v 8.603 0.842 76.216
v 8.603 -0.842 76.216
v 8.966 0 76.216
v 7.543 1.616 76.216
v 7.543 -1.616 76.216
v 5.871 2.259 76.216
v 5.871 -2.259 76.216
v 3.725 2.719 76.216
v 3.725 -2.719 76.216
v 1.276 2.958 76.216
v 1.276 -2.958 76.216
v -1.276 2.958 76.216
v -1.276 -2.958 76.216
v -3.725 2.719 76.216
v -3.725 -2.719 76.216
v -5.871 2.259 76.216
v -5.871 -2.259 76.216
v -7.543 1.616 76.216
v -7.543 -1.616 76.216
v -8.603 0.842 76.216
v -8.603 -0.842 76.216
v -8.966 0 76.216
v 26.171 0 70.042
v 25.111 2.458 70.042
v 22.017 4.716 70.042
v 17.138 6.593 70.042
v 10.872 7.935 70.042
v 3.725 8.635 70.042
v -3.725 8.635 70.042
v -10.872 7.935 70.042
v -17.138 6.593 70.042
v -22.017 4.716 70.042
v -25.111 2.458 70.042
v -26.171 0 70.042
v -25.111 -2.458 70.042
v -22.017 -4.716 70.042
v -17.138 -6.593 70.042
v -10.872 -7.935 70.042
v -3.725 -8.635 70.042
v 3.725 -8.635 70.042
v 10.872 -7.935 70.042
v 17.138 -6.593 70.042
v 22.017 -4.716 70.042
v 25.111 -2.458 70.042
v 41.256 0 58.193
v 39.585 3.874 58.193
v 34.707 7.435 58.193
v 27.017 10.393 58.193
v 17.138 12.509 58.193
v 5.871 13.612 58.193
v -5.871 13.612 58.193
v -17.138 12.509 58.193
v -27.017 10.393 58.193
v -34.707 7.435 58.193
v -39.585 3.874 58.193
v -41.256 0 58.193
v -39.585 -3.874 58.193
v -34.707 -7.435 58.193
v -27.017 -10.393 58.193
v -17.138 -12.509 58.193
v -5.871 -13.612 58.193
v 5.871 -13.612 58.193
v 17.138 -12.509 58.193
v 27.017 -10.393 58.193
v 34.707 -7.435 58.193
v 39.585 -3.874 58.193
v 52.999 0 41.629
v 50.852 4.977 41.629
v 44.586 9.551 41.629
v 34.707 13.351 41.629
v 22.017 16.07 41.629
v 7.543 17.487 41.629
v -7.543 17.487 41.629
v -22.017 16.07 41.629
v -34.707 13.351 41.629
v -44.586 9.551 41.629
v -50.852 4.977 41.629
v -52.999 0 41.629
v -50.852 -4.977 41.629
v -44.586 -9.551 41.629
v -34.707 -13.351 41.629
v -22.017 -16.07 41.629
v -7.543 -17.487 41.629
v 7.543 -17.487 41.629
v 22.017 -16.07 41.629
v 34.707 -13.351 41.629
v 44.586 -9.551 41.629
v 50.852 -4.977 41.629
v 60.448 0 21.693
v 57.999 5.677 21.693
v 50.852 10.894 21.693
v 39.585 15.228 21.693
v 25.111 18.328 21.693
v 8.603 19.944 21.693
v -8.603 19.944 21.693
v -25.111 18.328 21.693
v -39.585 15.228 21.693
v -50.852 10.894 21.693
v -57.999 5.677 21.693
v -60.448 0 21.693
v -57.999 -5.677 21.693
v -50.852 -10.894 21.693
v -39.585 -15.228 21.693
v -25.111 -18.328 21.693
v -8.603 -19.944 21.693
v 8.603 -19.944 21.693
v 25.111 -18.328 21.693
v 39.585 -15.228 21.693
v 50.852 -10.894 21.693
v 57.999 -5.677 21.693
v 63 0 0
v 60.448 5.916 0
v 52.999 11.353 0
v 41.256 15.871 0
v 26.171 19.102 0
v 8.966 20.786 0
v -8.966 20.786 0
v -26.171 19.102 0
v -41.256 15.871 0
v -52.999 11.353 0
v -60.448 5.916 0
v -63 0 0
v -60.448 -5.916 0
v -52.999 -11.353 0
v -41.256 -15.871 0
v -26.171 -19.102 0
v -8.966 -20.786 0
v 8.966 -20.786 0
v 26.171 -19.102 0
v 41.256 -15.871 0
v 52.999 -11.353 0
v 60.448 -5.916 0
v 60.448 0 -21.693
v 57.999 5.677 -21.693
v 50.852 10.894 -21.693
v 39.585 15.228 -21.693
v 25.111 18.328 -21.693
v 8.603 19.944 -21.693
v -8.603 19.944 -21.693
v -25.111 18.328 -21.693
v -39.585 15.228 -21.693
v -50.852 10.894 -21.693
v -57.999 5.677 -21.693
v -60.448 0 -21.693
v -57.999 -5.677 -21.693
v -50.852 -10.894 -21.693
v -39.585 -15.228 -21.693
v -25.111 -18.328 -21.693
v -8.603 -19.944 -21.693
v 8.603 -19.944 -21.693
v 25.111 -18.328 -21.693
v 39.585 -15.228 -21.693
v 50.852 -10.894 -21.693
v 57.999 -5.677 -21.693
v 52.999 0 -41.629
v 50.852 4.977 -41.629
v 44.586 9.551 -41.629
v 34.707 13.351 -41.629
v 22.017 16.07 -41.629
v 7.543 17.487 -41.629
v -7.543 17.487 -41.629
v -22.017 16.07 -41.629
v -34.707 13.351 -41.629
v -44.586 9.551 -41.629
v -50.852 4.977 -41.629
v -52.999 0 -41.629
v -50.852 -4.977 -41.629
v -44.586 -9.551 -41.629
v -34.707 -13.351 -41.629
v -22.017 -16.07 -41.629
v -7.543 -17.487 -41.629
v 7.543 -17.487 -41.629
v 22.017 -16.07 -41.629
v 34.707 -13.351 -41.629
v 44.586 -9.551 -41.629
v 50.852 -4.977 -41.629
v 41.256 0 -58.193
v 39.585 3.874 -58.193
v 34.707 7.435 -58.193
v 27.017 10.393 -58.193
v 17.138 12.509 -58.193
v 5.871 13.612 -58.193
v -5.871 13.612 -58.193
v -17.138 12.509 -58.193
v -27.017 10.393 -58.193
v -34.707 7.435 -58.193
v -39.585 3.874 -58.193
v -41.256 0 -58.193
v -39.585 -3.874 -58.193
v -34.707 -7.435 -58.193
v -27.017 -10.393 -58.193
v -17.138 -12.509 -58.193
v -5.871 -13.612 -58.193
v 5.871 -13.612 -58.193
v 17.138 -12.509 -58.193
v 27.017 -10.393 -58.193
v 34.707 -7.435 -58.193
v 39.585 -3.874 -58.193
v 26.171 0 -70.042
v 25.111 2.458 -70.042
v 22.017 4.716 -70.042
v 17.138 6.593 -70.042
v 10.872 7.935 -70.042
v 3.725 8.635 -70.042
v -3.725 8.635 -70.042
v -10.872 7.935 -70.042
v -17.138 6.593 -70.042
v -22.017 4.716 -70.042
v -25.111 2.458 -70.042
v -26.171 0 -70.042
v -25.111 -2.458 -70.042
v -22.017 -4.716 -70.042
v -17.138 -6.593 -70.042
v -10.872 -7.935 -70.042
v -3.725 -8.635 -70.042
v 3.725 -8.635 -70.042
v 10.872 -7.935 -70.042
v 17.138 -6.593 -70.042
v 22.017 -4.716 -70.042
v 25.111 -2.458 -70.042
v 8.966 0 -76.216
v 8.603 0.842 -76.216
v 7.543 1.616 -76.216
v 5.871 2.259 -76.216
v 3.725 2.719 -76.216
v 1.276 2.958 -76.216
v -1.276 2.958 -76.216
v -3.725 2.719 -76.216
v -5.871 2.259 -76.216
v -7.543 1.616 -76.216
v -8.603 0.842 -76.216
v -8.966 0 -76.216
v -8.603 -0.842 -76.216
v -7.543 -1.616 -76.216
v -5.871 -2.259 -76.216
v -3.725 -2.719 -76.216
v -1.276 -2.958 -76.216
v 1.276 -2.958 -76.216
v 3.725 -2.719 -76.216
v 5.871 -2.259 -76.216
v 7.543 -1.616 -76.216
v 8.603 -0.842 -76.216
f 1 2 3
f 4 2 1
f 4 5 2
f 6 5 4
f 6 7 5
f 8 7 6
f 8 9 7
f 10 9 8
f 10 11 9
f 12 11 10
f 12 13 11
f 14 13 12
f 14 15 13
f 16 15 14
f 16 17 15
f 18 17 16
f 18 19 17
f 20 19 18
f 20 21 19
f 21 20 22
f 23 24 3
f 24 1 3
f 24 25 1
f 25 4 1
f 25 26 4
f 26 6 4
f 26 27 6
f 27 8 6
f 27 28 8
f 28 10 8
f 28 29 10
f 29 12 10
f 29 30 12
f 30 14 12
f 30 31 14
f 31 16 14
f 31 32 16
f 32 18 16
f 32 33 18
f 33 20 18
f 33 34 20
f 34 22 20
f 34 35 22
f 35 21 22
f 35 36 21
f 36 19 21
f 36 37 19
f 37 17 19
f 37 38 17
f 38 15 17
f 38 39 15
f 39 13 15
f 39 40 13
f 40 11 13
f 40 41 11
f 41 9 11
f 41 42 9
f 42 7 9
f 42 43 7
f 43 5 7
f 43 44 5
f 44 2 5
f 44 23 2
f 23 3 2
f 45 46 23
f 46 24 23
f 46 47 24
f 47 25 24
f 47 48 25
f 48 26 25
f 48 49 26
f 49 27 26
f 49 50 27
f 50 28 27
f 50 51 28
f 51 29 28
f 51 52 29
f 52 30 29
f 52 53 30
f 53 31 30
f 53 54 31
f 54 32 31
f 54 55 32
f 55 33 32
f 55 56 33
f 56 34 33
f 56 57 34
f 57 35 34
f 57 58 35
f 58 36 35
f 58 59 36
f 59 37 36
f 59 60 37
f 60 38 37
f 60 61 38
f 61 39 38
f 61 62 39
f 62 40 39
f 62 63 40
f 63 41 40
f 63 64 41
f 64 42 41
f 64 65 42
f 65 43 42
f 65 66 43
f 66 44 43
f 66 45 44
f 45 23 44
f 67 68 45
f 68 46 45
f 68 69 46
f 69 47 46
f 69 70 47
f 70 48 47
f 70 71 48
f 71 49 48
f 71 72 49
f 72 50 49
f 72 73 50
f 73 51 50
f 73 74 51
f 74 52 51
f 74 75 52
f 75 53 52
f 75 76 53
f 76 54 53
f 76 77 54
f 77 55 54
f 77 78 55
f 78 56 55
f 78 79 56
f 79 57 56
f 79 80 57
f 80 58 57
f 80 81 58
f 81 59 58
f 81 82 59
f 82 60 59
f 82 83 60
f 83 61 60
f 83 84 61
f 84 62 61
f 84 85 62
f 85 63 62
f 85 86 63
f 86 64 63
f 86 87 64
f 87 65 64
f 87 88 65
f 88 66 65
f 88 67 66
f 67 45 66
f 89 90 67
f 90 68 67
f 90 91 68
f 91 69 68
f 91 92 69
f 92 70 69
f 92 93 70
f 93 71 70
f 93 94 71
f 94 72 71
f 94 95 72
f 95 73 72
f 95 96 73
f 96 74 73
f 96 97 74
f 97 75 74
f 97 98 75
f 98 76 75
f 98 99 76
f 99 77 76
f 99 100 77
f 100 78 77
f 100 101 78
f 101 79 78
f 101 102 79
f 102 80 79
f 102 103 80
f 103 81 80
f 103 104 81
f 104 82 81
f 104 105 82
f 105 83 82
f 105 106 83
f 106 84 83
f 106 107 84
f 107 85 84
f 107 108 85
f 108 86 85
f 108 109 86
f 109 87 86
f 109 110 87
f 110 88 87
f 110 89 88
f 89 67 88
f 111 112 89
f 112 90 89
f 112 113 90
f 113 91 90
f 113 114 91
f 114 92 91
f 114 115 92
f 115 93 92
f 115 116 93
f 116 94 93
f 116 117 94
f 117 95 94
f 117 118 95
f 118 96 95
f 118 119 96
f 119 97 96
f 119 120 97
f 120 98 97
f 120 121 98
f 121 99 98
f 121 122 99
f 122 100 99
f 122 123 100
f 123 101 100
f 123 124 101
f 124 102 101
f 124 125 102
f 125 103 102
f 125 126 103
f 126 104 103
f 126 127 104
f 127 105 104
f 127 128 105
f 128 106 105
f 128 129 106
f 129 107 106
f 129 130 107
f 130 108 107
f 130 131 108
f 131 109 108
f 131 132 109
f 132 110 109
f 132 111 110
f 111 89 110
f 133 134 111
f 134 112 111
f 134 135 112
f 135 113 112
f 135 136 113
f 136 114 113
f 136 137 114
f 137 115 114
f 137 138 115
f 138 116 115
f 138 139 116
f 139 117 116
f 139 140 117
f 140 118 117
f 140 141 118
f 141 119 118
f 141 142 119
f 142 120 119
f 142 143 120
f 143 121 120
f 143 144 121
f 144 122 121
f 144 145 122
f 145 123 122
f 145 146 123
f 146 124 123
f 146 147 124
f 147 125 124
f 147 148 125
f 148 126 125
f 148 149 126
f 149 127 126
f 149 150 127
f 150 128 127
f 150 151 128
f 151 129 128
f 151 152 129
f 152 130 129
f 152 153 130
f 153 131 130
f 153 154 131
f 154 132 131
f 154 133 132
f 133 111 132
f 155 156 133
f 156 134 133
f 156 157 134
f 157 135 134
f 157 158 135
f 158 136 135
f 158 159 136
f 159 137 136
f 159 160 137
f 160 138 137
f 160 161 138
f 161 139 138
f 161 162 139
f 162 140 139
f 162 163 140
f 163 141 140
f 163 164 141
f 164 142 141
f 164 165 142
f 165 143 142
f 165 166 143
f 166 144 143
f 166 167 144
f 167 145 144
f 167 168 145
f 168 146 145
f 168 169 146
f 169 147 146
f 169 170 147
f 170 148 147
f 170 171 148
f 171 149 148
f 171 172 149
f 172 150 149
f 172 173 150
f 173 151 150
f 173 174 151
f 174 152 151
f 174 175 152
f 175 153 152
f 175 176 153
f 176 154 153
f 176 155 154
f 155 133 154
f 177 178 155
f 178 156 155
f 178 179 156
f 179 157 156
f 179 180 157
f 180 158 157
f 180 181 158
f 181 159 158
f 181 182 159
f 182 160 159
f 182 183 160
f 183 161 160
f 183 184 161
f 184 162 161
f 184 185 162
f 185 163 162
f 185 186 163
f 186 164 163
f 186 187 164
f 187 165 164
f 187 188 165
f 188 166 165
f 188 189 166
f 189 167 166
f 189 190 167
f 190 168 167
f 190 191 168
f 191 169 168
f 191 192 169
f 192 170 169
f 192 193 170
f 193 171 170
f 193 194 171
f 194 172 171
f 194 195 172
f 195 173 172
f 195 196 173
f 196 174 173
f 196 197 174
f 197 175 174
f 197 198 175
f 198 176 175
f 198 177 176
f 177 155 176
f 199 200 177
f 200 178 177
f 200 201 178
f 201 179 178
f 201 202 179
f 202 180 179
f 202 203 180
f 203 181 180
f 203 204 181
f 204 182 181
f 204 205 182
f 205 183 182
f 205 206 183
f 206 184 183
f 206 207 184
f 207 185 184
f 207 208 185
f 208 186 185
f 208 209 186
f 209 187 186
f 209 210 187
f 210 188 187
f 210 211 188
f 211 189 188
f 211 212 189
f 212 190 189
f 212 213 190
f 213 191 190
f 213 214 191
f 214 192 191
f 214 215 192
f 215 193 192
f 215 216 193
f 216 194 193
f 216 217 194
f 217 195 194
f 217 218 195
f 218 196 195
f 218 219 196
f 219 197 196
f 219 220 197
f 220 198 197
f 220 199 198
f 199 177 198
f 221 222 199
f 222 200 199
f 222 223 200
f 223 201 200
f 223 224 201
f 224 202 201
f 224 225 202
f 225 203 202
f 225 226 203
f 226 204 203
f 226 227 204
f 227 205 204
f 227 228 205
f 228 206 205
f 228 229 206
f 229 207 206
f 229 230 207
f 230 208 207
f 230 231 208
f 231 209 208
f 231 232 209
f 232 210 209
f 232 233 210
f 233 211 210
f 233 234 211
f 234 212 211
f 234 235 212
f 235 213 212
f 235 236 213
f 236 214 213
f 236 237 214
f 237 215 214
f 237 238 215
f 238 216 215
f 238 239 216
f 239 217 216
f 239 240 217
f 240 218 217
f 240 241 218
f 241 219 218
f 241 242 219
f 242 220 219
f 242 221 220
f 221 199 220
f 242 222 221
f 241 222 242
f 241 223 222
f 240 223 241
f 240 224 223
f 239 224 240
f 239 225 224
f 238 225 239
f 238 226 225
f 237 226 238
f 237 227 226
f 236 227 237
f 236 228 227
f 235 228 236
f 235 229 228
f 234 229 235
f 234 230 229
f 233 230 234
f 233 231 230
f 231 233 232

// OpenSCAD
// Generated by SolidPython 1.0.1 on 2020-07-29 00:46:48


scale(v = [9, 3, 11]) {
	sphere(r = 7);
}
/***********************************************
*********      SolidPython code:      **********
************************************************
 
# import packages: SolidPython
from solid import *
from solid.utils import *
from itertools import chain, combinations, permutations


class Resize:

    def __init__(self, scad_file):
        self.scad_file = scad_file
        #self.scad_file = import_scad(scad_file)
        # cone/cylinder param:
        self.r1 = 0
        self.r2 = 0
        self.h = 0
        # rectangular prism param:
        self.w = 0
        self.l = 0
        # ellipse param:
        self.r = 0

    # import OpenScad code (file name corresponds to shape)


    # classify shape + parameters
    def assign(self, param1, param2, param3):
        if self.scad_file == 'cone.scad':
            self.r1 = param1
            self.r2 = param2
            self.h = param3
        elif self.scad_file == 'cylinder.scad':
            self.r1 = param1
            self.r2 = param2
            self.h = param3
        elif self.scad_file == 'rectangularPrism.scad':
            self.h = param1
            self.l = param2
            self.w = param3
        else:
            self.r = param1
            self.h = param2

    # resize parameters
    def iterate(self):
        x = range(3, 20, 2)
        i = 1
        if self.scad_file == 'cone.scad':
            tempList = list(permutations(x, 2))
            for temp in tempList:
                param1 = temp[0]
                param2 = temp[1]
                filepath = 'produced_scad_files/' + 'cone' + str(param1) + '_' + str(param2) + '_' + '.scad'
                scad_render_to_file(cylinder(h=param1, r1=param2, r2=0), filepath)

        elif self.scad_file == 'cylinder.scad':
            tempList = list(permutations(x, 3))
            for temp in tempList:
                param1 = temp[0]
                param2 = temp[1]
                filepath = 'produced_scad_files/' + 'cylinder' + str(param1) + '_' + str(param2) + '_' + '.scad'
                scad_render_to_file(cylinder(h=param1, r1=param2, r2=param2), filepath)

        elif self.scad_file == 'rectangularPrism.scad':
            tempList = list(permutations(x, 3))
            for temp in tempList:
                param1 = temp[0]
                param2 = temp[1]
                param3 = temp[2]
                filepath = 'produced_scad_files/' + 'rectangularPrism' + str(param1) + '_' + str(param2) + '_' + str(
                    param3) + '.scad'
                scad_render_to_file(cube(size=(param1, param2, param3)), filepath)

        elif self.scad_file == 'ellipse.scad':
            tempList = list(permutations(x, 4))
            for temp in tempList:
                param1 = temp[0]
                param2 = temp[1]
                param3 = temp[2]
                param4 = temp[3]
                filepath = 'produced_scad_files/' + 'ellipse' + str(param1) + '_' + str(param2) + '_' + str(param3) + '_' + str(param4) + '.scad'
                scad_render_to_file(scale([param1, param2, param3])(sphere(r=param4)), filepath)

    def render_to_scadfile(self):
        scad_render_to_file(scad, 'example.scad') 
 
************************************************/
